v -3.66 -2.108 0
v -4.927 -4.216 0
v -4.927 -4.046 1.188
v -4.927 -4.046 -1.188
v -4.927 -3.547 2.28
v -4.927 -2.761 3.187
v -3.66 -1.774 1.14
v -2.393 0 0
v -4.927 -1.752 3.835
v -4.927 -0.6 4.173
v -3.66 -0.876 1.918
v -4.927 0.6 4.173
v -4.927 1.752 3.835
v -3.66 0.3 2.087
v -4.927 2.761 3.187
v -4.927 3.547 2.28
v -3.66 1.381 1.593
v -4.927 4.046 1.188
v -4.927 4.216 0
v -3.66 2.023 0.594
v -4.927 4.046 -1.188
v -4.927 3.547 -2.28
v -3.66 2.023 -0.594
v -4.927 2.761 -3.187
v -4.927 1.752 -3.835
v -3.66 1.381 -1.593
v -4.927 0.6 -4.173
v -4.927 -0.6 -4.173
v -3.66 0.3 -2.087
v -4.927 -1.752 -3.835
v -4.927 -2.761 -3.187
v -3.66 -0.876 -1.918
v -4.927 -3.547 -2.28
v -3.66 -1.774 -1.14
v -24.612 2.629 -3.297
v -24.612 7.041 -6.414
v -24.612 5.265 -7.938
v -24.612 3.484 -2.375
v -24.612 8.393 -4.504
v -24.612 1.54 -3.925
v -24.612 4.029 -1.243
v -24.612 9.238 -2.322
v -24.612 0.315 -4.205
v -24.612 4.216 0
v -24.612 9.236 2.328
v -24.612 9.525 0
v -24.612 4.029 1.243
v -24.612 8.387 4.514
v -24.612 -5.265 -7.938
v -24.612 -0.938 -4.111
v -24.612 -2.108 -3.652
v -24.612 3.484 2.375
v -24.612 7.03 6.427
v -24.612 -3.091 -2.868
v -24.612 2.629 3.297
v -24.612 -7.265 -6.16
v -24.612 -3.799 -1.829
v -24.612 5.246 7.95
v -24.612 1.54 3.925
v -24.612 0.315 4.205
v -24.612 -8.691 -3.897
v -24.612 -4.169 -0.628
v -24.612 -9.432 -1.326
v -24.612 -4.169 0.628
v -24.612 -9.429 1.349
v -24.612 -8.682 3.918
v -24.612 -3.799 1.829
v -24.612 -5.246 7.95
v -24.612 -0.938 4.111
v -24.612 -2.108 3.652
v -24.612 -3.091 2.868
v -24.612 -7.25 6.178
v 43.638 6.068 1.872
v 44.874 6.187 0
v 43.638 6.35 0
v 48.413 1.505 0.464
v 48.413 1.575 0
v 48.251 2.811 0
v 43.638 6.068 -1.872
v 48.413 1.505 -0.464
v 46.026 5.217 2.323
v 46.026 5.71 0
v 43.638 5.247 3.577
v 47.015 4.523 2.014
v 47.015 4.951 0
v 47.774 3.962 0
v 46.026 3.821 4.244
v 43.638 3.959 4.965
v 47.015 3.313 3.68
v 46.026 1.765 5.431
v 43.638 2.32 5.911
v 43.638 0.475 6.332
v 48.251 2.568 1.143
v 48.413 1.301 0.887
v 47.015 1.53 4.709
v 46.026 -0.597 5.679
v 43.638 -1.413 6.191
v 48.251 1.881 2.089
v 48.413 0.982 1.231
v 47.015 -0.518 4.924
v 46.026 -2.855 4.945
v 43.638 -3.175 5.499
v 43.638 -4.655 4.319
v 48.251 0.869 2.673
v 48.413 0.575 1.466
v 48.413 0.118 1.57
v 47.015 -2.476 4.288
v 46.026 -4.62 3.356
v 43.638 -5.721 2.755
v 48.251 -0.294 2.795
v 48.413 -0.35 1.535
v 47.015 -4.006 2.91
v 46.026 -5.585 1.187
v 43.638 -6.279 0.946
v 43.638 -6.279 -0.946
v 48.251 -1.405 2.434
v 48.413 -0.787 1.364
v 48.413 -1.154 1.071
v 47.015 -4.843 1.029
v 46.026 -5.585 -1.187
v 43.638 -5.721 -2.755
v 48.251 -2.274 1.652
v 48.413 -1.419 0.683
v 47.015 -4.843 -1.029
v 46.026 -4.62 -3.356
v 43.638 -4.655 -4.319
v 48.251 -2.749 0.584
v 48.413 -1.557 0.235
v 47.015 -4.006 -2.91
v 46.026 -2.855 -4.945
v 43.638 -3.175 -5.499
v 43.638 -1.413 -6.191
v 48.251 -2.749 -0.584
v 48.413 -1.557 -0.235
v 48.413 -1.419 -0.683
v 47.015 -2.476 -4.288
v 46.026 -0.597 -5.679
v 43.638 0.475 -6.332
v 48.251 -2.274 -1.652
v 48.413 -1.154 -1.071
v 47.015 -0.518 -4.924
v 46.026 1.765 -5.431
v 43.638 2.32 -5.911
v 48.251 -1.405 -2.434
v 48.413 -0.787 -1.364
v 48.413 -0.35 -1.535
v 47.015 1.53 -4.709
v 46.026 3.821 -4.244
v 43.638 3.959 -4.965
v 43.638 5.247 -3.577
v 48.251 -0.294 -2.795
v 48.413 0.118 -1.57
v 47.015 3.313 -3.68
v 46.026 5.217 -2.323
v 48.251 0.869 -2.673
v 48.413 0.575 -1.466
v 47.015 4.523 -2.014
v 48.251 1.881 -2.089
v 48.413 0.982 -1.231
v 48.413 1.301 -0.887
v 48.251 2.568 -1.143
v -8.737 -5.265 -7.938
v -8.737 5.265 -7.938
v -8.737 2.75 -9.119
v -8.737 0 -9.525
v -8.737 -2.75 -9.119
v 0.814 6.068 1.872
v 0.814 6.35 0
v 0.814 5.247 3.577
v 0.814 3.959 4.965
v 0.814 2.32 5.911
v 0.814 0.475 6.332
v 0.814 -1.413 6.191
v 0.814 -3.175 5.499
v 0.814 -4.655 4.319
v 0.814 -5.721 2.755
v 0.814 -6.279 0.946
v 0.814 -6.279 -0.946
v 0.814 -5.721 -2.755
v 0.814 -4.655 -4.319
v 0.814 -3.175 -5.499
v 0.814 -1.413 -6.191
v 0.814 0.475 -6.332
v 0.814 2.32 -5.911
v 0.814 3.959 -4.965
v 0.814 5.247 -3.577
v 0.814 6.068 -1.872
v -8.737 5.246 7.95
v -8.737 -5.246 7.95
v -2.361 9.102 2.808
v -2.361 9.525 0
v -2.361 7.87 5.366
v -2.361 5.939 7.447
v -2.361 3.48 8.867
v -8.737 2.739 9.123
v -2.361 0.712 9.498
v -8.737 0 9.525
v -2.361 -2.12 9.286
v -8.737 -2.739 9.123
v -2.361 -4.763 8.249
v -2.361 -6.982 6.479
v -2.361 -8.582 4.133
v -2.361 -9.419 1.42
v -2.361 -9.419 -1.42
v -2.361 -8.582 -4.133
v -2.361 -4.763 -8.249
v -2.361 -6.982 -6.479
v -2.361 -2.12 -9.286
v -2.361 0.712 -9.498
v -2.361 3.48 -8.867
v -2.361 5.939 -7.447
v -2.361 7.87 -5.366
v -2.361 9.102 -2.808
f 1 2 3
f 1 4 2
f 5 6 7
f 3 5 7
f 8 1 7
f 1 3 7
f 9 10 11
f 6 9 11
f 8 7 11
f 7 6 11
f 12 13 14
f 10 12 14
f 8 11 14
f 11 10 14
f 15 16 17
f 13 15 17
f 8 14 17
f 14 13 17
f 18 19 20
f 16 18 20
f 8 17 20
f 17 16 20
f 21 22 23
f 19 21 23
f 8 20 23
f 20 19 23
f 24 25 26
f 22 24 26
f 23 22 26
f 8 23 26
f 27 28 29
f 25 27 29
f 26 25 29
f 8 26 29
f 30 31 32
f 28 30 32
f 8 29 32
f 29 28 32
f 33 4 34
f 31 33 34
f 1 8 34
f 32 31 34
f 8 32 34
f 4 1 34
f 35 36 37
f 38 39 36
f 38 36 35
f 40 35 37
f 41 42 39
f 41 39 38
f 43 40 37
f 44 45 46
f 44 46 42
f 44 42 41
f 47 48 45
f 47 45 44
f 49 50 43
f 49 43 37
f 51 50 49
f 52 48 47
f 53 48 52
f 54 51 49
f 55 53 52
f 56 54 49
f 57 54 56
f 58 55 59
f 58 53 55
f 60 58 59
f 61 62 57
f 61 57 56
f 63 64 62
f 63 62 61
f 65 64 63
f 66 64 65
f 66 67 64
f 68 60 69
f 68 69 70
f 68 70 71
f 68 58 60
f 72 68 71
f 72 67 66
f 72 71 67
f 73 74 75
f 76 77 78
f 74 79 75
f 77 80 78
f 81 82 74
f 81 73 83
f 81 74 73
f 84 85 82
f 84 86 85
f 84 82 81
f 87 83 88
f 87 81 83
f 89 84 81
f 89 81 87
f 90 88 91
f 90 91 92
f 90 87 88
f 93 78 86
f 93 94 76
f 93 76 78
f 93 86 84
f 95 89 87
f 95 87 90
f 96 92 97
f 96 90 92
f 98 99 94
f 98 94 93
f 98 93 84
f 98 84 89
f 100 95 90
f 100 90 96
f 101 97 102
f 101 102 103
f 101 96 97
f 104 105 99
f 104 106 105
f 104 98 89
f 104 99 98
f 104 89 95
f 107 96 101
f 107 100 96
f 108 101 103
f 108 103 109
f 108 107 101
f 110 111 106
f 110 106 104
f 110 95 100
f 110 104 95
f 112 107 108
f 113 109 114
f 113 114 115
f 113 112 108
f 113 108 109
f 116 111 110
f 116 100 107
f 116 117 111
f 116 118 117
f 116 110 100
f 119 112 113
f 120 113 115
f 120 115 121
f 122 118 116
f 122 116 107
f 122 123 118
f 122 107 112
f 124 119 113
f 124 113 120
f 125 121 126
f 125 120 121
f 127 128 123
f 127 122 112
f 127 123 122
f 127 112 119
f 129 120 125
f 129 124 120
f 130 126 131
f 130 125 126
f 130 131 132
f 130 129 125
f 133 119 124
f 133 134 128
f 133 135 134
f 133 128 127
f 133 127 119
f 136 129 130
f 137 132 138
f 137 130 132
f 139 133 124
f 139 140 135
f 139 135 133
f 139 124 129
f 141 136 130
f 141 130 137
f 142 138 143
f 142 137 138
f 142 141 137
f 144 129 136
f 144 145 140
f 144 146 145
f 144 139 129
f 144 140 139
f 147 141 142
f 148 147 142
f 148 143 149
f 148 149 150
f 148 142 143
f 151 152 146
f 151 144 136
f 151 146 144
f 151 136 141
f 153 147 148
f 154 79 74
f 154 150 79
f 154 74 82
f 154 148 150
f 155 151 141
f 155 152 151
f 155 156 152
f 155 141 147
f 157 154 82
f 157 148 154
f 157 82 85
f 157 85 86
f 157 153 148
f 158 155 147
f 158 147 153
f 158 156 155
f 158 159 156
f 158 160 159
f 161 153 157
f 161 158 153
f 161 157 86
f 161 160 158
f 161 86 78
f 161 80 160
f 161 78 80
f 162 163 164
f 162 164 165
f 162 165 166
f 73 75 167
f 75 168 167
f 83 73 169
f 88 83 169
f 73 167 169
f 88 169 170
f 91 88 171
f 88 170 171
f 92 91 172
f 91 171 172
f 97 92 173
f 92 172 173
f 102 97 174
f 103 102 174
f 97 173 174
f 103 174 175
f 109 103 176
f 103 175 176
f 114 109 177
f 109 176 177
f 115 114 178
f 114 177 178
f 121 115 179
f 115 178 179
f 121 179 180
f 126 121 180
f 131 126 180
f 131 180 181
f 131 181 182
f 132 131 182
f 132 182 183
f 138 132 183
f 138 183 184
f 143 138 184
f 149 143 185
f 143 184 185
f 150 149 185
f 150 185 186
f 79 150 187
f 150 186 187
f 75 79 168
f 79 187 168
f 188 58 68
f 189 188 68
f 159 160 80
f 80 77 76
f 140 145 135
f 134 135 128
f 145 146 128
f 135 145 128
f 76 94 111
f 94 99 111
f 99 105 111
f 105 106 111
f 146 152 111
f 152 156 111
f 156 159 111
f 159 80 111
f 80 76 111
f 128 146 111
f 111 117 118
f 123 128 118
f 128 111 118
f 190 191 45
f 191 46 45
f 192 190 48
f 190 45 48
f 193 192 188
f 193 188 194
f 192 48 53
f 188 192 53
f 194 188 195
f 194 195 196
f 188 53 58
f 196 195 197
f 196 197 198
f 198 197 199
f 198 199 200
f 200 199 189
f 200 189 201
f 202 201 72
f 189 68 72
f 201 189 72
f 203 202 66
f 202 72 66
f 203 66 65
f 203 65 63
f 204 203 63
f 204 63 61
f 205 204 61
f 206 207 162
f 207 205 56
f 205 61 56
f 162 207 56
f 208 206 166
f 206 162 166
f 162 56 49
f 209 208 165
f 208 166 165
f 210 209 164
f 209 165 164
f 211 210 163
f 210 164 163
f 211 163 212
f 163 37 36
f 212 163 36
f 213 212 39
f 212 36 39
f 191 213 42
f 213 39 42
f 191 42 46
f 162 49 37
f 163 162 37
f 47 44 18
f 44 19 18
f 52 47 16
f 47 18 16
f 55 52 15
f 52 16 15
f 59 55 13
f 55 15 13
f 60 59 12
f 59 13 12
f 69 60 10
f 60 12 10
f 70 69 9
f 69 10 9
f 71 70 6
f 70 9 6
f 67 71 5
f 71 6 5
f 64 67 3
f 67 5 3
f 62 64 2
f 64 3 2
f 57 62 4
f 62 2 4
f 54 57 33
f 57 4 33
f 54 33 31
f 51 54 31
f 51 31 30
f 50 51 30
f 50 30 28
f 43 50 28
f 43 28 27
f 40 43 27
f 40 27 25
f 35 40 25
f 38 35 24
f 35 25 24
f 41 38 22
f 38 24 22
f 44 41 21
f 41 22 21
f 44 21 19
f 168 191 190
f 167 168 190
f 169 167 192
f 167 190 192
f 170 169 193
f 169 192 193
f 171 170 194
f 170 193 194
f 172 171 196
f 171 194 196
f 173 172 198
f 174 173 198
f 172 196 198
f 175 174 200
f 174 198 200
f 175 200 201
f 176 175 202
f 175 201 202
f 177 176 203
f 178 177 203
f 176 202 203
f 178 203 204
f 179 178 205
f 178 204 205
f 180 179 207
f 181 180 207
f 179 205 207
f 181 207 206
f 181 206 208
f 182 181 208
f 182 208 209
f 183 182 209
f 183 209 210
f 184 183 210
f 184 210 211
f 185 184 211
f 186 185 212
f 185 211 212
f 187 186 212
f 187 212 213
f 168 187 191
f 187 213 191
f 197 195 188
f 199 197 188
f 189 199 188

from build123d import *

# Parameters (mm, degrees)
F0_W        = 15.4432
F0_H        = 9.525
F3_DEPTH    = 15.875
F4_R        = 4.7752
F5_S5_R     = 6.35
F5_T6_DEPTH = 15
F7_D        = 8.4328
F7_DEPTH    = 19.685
F7_TIP      = 2.5334687141


# Not quite as in the source:
# - a fillet or chamfer that OpenCascade refuses, or shapes differently, is made with other operations: its cross-section is extruded or revolved along the edge and cut away or added


with BuildPart() as f1:
    # F0 (on Top) → F1 (revolve)
    with BuildSketch(Plane.XY):
        with Locations((-16.8899756006, 4.7625)):
            Rectangle(F0_W, F0_H)
        Polygon((-9.1683756006, 9.525), (-9.1683756006, 0), (48.4134243994, 0), (48.4134243994, 6.35), (0.8138243994, 6.35), (0.8138243994, 9.525), align=None)
    revolve(axis=Axis((11.9009243994, 0, 0), (1, 0, 0)))

    # F2 (on face) → F3 (cut)
    with BuildSketch(Plane(origin=(-24.6115756006, 0, 0), x_dir=(0, -1, 0), z_dir=(-1, 0, 0))):
        with BuildLine():
            ThreePointArc((5.2459455735, 7.9502), (0, 9.525), (-5.2459455735, 7.9502))
            Line((-5.2459455735, 7.9502), (5.2459455735, 7.9502))
        make_face()
        with BuildLine():
            Line((5.2651418547, -7.9375), (-5.2651418547, -7.9375))
            ThreePointArc((-5.2651418547, -7.9375), (0, -9.525), (5.2651418547, -7.9375))
        make_face()
    extrude(amount=-F3_DEPTH, mode=Mode.SUBTRACT)

    # F4
    f4_edges = [f1.edges().sort_by_distance(p)[0] for p in [
        (48.413424, -6.35, 0),
    ]]
    fillet(f4_edges, radius=F4_R)

    # F5: chamfer of 3.175 on 1 edges, made by hand


with BuildPart() as f5_tool2:
    # F5_s3 → F5_t4 (revolve)
    with BuildSketch(Plane.XY):
        Polygon((0.8138243994, 6.35), (-2.3611756006, 9.525), (0.8138243994, 9.525), align=None)
    revolve(axis=Axis((0.8138243994, 0, 0), (1, 0, 0)))

    # F5_s5 → F5_t6 (cut, symmetric)
    with BuildSketch(Plane.YZ.offset(-0.8)):
        Circle(F5_S5_R)
    extrude(amount=F5_T6_DEPTH, both=True, mode=Mode.SUBTRACT)


with BuildPart() as f1_1:
    add(f1.part)

    # F5_t1: cut F5_tool2
    add(f5_tool2.part, mode=Mode.SUBTRACT)

    # F7
    with Locations(Plane(origin=(-24.6115756006, 0, 0), x_dir=(0, -1, 0), z_dir=(-1, 0, 0))):
        with Locations((0, 0)):
            Hole(F7_D / 2, depth=F7_DEPTH)
            with Locations((0, 0, -(F7_DEPTH + F7_TIP / 2))):  # 118° drill point
                Cone(0, F7_D / 2, F7_TIP, mode=Mode.SUBTRACT)


solid = f1_1.part
